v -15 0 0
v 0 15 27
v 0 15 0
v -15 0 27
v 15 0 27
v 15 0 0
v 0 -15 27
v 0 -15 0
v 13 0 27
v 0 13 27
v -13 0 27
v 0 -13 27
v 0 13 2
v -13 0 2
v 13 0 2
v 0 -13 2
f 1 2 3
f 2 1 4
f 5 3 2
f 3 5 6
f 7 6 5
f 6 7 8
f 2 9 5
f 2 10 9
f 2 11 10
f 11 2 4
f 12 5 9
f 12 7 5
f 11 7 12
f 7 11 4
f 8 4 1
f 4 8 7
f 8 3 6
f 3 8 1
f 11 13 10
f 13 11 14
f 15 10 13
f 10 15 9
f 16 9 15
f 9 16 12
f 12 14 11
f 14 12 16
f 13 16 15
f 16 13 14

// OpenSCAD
difference(){
cylinder(h=27,r1=15,r2=15,$fn=4);
    translate([0,0,2])
    cylinder(h=25.5,r1=13,r2=13,$fn=4);
}
